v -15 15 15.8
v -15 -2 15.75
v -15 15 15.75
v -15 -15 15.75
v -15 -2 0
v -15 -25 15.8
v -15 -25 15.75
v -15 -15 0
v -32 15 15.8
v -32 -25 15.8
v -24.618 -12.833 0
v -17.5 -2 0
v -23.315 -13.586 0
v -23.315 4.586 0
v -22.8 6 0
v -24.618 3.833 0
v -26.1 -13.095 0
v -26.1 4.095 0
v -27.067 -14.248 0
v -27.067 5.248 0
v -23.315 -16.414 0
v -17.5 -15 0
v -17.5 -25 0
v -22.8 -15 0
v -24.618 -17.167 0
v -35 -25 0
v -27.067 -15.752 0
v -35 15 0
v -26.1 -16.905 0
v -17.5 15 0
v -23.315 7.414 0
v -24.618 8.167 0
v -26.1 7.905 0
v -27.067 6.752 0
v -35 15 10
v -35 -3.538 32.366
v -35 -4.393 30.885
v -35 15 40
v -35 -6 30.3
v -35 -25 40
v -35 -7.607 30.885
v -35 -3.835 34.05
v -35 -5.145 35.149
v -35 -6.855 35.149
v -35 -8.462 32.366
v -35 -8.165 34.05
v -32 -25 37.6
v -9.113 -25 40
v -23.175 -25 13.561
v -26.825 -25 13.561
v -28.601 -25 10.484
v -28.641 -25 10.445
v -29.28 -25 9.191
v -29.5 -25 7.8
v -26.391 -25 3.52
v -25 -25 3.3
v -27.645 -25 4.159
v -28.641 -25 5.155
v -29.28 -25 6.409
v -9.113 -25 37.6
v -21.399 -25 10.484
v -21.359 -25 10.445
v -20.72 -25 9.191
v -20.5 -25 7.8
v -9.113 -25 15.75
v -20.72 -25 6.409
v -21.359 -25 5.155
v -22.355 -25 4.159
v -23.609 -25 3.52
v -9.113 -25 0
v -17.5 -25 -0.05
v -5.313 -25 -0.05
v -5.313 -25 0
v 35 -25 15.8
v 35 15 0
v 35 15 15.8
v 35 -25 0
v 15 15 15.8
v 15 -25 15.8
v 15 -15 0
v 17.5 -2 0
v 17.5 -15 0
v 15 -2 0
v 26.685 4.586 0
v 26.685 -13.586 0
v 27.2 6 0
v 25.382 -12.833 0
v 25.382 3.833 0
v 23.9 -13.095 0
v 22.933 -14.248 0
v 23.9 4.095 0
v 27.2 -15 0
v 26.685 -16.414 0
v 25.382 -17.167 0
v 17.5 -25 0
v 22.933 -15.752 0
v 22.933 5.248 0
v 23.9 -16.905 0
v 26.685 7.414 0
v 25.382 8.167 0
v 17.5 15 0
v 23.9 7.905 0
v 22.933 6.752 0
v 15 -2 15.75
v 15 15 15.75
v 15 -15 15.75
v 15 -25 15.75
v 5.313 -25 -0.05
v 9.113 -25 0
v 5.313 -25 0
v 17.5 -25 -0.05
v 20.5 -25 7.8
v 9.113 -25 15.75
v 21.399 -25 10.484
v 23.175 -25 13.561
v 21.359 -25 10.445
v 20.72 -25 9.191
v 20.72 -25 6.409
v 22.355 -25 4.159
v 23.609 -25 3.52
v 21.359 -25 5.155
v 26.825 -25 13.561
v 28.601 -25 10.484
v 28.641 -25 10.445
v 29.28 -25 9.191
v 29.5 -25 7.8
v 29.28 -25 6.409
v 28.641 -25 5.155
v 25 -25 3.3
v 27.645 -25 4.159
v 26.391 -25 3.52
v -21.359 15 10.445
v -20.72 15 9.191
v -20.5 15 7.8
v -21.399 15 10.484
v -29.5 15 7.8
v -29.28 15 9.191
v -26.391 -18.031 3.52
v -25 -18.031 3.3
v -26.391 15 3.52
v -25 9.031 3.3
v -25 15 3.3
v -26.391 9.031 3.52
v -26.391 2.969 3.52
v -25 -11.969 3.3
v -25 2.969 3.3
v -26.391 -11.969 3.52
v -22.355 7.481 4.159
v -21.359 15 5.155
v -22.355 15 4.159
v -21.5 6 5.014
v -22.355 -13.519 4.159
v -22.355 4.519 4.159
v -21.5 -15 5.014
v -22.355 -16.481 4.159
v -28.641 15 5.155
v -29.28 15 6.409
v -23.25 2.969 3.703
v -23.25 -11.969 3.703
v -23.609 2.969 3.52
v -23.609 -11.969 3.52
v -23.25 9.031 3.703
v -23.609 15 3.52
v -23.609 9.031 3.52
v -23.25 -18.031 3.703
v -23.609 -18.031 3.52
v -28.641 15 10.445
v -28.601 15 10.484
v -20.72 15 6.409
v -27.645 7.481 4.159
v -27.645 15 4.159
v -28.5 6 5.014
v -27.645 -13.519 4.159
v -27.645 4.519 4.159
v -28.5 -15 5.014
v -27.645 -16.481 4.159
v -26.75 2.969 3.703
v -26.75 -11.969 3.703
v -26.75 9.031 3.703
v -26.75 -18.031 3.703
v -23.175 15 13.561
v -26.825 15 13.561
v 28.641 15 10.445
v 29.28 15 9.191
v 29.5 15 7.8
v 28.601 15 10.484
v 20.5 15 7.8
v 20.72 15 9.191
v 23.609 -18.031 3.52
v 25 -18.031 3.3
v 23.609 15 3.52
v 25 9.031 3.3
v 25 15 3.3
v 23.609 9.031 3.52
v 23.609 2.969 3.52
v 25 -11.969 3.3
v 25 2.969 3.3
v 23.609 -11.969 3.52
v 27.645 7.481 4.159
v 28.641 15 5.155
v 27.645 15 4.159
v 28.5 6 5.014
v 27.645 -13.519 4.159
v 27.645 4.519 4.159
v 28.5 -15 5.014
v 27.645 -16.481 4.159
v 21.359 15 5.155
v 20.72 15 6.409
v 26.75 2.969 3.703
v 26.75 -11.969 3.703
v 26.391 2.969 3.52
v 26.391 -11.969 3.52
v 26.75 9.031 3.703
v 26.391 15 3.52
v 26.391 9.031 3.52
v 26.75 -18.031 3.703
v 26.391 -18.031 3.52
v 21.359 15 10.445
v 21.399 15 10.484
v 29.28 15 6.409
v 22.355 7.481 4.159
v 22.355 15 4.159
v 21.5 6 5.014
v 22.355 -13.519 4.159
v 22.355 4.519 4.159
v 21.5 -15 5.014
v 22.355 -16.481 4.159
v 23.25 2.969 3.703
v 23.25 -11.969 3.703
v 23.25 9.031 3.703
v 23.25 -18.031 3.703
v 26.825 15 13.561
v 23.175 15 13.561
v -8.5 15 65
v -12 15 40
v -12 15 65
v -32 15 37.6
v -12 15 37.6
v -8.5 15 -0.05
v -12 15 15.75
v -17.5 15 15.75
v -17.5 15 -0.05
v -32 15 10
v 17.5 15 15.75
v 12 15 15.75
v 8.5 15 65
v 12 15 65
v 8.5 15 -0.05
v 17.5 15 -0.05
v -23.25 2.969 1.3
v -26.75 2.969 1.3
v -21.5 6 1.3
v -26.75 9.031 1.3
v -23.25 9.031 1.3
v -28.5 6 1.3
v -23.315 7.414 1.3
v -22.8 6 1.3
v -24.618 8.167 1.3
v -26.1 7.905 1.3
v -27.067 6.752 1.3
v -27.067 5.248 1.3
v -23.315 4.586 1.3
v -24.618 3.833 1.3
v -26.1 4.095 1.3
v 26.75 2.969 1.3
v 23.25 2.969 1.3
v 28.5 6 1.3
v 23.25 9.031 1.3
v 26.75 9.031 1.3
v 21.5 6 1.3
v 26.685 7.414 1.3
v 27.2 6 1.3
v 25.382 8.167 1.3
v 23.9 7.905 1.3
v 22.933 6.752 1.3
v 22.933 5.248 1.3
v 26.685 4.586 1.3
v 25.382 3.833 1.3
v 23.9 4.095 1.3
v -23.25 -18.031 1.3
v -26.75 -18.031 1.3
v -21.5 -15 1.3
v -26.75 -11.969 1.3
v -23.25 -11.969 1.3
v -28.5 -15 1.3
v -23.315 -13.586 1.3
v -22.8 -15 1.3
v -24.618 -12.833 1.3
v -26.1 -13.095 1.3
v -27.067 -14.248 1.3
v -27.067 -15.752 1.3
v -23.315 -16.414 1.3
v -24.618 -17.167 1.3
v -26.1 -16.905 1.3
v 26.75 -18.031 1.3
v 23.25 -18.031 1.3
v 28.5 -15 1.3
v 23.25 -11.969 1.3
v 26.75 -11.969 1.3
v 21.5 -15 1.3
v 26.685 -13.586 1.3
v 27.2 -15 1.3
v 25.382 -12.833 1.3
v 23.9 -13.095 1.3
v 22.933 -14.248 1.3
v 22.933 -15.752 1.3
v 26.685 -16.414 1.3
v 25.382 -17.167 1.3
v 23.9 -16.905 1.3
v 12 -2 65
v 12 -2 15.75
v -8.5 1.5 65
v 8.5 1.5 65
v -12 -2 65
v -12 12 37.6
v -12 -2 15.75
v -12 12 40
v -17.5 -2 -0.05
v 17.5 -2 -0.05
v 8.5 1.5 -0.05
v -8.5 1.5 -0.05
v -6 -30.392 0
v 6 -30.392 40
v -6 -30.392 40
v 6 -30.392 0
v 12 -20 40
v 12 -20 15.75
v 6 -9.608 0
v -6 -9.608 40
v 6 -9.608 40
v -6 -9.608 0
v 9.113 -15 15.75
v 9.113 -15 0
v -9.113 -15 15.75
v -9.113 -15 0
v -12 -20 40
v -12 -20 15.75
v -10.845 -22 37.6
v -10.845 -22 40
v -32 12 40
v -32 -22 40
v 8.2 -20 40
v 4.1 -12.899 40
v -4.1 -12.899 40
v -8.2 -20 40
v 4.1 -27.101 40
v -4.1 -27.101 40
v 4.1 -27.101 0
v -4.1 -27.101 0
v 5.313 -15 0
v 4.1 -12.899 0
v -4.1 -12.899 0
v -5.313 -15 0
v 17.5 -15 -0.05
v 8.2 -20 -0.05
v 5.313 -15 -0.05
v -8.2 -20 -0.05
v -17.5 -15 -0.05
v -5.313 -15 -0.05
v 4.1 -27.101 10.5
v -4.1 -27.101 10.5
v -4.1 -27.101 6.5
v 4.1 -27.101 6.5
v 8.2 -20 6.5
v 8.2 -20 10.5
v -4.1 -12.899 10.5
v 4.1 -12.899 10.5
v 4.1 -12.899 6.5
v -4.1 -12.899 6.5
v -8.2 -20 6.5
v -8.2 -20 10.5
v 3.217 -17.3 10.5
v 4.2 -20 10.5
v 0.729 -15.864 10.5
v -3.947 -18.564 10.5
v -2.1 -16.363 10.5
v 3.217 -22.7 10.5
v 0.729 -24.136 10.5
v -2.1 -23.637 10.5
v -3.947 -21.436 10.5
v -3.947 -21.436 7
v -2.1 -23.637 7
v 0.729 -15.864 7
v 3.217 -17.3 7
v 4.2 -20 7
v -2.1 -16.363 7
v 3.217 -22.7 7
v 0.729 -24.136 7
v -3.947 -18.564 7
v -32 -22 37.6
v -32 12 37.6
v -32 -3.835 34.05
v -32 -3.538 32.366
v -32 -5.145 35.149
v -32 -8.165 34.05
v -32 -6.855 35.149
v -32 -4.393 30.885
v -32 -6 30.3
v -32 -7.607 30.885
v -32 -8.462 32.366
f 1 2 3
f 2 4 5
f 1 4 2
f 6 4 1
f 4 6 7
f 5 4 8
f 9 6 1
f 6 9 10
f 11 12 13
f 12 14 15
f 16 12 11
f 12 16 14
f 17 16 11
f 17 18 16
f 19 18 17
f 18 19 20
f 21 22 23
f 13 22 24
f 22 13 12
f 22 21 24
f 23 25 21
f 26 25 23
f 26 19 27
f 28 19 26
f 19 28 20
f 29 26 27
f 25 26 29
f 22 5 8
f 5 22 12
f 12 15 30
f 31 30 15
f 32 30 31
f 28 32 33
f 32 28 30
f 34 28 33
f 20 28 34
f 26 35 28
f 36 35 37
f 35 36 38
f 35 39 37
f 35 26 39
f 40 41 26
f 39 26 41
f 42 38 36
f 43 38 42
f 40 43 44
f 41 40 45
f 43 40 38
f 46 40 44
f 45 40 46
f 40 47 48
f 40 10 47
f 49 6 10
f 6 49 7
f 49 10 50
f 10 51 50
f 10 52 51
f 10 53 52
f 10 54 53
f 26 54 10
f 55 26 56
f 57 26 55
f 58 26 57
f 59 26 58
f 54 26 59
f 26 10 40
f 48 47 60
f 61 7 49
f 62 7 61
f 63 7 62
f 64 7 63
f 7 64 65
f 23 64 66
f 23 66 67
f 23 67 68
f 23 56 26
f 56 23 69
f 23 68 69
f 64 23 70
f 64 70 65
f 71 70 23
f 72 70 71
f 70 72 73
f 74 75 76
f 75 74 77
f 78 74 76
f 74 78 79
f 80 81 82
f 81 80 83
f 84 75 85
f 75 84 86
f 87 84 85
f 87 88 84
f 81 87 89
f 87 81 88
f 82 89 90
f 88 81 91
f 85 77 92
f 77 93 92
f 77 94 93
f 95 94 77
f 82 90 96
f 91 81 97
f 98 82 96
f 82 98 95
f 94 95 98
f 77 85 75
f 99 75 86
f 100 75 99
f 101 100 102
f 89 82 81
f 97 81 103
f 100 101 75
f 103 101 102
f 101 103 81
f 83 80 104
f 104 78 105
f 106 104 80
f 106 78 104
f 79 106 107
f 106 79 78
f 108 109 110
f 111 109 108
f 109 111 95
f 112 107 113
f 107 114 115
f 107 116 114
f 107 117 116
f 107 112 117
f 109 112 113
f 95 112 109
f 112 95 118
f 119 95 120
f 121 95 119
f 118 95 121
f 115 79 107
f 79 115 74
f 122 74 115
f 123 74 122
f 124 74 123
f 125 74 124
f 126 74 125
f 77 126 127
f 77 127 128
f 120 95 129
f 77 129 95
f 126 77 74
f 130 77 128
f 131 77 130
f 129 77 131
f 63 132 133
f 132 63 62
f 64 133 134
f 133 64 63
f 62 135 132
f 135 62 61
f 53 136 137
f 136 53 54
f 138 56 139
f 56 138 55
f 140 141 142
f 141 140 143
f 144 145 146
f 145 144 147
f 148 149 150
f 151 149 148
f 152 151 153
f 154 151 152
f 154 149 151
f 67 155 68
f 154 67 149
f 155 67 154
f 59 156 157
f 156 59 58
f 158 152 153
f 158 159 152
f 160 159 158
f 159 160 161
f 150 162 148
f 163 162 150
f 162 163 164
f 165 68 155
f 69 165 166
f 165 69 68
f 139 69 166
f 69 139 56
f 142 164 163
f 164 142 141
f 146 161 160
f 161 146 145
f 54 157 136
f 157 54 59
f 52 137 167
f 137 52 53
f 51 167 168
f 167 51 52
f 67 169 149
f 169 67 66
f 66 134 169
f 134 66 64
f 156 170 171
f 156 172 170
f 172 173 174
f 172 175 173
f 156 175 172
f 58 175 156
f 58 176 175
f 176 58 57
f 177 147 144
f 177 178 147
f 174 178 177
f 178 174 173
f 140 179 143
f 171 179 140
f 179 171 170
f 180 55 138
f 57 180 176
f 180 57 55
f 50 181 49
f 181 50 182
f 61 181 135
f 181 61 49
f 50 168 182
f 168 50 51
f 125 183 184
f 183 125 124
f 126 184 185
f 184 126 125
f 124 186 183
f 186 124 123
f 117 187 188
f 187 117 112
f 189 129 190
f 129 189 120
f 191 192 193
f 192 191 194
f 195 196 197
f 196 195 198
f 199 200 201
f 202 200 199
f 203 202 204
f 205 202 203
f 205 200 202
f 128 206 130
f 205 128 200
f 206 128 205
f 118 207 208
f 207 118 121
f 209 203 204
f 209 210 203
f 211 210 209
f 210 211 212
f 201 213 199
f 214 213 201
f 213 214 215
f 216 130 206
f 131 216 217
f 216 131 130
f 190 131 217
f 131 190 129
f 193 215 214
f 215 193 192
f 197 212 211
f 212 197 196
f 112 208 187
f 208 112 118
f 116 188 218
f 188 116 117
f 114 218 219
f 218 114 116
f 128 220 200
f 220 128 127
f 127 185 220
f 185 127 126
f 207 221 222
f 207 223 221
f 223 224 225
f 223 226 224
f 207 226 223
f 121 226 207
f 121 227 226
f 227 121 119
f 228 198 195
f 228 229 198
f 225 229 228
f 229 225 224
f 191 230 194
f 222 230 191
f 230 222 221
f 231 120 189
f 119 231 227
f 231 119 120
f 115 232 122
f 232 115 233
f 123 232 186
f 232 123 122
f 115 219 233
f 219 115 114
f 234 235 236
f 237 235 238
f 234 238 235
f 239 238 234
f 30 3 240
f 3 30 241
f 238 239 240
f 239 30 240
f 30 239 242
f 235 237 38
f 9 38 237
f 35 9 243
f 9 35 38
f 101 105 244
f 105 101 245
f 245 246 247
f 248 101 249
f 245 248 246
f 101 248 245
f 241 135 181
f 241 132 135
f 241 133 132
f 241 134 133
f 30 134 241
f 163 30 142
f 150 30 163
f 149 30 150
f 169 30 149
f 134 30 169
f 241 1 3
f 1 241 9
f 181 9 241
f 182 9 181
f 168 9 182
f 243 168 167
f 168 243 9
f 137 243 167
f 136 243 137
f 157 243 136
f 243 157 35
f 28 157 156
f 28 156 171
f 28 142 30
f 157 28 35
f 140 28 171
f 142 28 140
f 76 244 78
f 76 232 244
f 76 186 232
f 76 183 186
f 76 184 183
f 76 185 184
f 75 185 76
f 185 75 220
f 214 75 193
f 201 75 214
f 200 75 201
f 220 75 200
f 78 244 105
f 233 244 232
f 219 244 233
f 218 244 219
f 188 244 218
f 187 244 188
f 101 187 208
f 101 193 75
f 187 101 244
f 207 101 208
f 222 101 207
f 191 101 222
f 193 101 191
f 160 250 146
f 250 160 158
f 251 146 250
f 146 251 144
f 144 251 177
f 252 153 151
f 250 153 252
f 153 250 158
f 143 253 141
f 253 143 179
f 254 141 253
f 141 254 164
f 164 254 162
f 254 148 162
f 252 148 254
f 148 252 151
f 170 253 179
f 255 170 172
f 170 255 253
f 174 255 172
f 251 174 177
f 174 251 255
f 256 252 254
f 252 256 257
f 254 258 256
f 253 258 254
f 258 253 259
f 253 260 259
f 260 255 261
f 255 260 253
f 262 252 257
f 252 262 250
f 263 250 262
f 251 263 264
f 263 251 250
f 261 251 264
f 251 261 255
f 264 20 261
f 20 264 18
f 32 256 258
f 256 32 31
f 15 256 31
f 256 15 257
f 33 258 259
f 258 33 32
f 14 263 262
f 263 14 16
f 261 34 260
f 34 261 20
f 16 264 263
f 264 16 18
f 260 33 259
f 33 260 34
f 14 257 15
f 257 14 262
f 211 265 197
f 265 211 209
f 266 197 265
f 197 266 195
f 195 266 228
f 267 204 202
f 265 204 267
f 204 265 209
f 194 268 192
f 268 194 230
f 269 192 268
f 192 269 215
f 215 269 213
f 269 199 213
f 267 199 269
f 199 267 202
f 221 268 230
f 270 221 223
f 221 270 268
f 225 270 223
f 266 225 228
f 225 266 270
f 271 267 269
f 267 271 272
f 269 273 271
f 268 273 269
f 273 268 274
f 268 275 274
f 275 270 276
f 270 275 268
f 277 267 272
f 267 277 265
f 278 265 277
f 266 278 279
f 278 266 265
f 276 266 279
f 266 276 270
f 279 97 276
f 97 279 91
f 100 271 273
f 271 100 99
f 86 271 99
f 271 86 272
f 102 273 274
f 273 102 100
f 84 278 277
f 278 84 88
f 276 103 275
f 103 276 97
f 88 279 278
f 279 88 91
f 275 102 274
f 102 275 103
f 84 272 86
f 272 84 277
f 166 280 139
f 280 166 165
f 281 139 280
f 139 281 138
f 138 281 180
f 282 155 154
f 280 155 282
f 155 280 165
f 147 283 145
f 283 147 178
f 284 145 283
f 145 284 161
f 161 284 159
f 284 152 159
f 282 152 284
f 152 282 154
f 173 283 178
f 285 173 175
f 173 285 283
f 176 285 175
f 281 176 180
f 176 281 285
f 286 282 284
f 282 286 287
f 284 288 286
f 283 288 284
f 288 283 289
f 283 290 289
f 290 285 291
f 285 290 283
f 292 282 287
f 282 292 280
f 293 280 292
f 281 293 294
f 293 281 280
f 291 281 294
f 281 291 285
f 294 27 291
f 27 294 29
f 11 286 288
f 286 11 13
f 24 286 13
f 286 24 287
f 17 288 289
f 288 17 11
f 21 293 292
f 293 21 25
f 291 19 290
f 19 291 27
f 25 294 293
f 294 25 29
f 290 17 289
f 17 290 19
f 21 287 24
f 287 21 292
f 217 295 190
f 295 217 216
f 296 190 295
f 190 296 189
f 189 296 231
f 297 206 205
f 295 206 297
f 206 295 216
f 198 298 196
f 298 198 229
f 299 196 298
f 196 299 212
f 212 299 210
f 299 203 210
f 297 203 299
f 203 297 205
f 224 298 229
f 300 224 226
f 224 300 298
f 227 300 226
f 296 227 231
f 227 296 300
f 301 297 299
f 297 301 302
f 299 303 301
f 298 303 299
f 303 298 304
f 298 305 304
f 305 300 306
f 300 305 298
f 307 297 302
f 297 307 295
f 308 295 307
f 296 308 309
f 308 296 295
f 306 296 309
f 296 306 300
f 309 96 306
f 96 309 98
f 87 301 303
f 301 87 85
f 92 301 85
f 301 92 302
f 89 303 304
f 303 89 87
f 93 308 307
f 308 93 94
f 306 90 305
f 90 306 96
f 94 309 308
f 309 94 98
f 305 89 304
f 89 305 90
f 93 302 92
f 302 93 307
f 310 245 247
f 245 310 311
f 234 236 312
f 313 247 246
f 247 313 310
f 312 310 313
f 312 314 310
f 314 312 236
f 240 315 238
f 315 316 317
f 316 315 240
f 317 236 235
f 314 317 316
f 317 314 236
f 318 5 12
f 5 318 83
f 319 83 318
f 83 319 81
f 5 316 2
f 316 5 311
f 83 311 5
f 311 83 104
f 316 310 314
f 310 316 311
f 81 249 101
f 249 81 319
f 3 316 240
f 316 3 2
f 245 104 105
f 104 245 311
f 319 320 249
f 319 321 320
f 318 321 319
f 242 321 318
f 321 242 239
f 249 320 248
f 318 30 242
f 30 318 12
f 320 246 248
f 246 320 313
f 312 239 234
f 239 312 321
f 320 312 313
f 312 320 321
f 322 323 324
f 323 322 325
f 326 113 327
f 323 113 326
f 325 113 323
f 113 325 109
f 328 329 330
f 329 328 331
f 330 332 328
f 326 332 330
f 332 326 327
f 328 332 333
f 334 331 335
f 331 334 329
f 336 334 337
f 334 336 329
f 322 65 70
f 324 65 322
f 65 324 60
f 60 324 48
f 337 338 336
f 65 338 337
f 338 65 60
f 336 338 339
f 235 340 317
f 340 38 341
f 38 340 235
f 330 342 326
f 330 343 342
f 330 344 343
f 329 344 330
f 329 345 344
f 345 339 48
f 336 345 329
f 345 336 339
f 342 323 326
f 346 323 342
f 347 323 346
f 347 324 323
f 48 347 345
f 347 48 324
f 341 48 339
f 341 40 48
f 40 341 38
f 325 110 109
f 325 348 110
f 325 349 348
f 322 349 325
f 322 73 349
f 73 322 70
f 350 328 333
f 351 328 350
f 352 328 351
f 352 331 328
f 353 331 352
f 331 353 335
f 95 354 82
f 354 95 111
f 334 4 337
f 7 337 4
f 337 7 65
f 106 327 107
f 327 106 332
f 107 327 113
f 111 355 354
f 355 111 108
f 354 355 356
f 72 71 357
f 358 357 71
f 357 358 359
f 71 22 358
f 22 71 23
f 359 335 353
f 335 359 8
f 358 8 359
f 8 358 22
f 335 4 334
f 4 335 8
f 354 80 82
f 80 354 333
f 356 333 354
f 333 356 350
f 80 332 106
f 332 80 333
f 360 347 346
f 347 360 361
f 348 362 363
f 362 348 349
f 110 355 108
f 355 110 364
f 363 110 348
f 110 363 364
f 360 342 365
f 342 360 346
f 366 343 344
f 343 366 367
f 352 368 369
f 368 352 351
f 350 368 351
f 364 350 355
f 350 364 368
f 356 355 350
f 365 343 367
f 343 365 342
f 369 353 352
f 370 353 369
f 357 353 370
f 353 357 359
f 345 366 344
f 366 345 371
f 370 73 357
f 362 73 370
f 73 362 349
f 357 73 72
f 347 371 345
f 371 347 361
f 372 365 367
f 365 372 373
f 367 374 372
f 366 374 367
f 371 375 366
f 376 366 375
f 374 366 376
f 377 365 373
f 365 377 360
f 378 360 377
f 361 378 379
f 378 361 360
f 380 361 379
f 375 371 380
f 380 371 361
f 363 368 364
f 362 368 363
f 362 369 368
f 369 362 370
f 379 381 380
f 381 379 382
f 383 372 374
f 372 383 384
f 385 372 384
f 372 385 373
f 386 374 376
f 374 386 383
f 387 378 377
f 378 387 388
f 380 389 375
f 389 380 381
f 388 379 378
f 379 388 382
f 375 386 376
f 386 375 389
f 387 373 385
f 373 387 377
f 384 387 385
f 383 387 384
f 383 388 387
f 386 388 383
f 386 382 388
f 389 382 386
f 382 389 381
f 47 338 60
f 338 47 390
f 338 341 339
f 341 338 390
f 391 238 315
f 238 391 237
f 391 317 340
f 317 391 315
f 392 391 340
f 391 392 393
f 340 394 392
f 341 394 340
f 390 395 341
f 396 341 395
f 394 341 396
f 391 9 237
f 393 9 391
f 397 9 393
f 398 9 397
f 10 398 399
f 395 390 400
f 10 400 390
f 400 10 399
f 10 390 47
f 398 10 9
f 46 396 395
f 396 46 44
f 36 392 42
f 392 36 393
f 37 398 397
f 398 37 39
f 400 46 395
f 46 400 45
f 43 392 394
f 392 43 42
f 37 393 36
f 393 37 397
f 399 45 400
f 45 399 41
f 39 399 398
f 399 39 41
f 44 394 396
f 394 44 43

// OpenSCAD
// file: configuration.scad
// PRUSA Mendel  
// Configuration file
// GNU GPL v2
// Josef Průša
// josefprusa@me.com
// prusadjs.cz
// http://www.reprap.org/wiki/Prusa_Mendel
// http://github.com/prusajr/PrusaMendel

// M8 rod diameter
m8_diameter = 8.4;

// M8 nut diameter diameter
// Used for $fn nut trick -> cylinder(h = 5, r=4.5, $fn=6, center=true);
m8_nut_diameter = 16.4;

// M4 rod/screw diameter
m4_diameter = 5;

// M4 nut diameter diameter
// Used for $fn nut trick -> cylinder(h = 5, r=4.5, $fn=6, center=true);
m4_nut_diameter = 9;

// M3 rod/screw diameter
m3_diameter = 4.4;

// M3 nut diameter diameter
// Used for $fn nut trick -> cylinder(h = 5, r=4.5, $fn=6, center=true);
m3_nut_diameter = 7;

// Bushing holders diameter
bushing_diameter = 11;
// main file
// PRUSA Mendel  
// X-end with idler mount
// GNU GPL v2
// Josef Průša
// josefprusa@me.com
// prusadjs.cz
// http://www.reprap.org/wiki/Prusa_Mendel
// http://github.com/prusajr/PrusaMendel

include <configuration.scad>

translate(v = [0,35,24.5]) union(){ 

difference(){
union(){
//translate(v = [0, -25, 0]) cube(size = [70,70,5], center = true);
translate(v = [0, -25, 0])translate(v = [-25, 0, -16.6])cube(size = [20,70,15.8], center = true);
translate(v = [0, -25, 0])translate(v = [25, 0, -16.6])cube(size = [20,70,15.8], center = true);
}
translate(v = [0, 0, -15])cube(size = [80,40,50], center = true);

//nut traps

translate(v = [-25, -29, -19.7]) cylinder(h = 7, r=m3_nut_diameter/2, $fn=6, center=true);
translate(v = [-25, -29, -20]) cylinder(h = 10, r=m3_diameter/2, $fn=9, center=true);
translate(v = [25, -29, -19.7]) cylinder(h = 7, r=m3_nut_diameter/2, $fn=6, center=true);
translate(v = [25, -29, -20]) cylinder(h = 10, r=m3_diameter/2, $fn=9, center=true);

translate(v = [-25, -50, -19.7]) cylinder(h = 7, r=m3_nut_diameter/2, $fn=6, center=true);
translate(v = [-25, -50, -20]) cylinder(h = 10, r=m3_diameter/2, $fn=9, center=true);
translate(v = [25, -50, -19.7]) cylinder(h = 7, r=m3_nut_diameter/2, $fn=6, center=true);
translate(v = [25, -50, -20]) cylinder(h = 10, r=m3_diameter/2, $fn=9, center=true);

//holes for axis
translate(v = [-25, -18, -16.7]) rotate(a=[90,0,0]) {
	cylinder(h = 120, r=4.5, $fn=20, center=true);
	translate(v = [0, 2.60, 0]) rotate(a=[0,0,0]) cylinder(h = 120, r=3.65, $fn=6, center=true);
}
translate(v = [25, -18, -16.7]) rotate(a=[90,0,0]) {
	cylinder(h = 120, r=4.5, $fn=20, center=true);
	translate(v = [0, 2.60, 0]) rotate(a=[0,0,0]) cylinder(h = 120, r=3.65, $fn=6, center=true);
}
//slider cutouts
translate(v = [0, -25, 15]) 
	difference(){
	translate(v = [0, -0, -14.5])cube(size = [23,23,50], center = true);
	}
//nut trap
translate(v = [0, -55, 15]) {
	difference(){
	translate(v = [0, -0, -15])cylinder(h = 50, r=12, $fn=6, center=true);
	}
}
}

//slider
translate(v = [0, -25, 15]) 
	difference(){
union(){
	translate(v = [0, -3.5, -7])cube(size = [24,17,65], center = true);

	translate(v = [0, -3.5, -31.65]) cube(size = [35,17,15.8], center = true);}
	translate(v = [0, -0, -7])cube(size = [17,17,70], center = true);}

//nut trap
translate(v = [0, -55, 15]) {
difference(){
	union(){difference(){
union(){
	translate(v = [0, -0, -19.5])cylinder(h = 40, r=12, $fn=6, center=true);
	translate(v = [0, 0, -31.65]) cube(size = [35,10,15.8], center = true);}
	cylinder(h = 90, r=m8_nut_diameter/2, $fn=6, center=true);
	}
	translate(v = [0, 0, -31]) cylinder(h = 4, r=11, $fn=6, center=true);}
	translate(v = [0, 0, 12.5]) cylinder(h = 90, r=m8_diameter/2, $fn=9, center=true);
}
}


//idler wheel connector
mirror(){
translate(v = [0, -35, -12]) difference(){
union(){
translate(v = [21, -23.5, 26.3]) cube(size = [24,3,2.4], center = true);
translate(v = [21, 13.5, 26.3]) cube(size = [24,3,2.4], center = true);
translate(v = [33.5, -5, 12.5]) cube(size = [3,40,30], center = true);
}

translate(v = [32.5, -6, 28-3-4.7]) rotate(a=[0,90,0]) cylinder(h = 90, r=m4_diameter/2, $fn=9, center=true);}
}}
